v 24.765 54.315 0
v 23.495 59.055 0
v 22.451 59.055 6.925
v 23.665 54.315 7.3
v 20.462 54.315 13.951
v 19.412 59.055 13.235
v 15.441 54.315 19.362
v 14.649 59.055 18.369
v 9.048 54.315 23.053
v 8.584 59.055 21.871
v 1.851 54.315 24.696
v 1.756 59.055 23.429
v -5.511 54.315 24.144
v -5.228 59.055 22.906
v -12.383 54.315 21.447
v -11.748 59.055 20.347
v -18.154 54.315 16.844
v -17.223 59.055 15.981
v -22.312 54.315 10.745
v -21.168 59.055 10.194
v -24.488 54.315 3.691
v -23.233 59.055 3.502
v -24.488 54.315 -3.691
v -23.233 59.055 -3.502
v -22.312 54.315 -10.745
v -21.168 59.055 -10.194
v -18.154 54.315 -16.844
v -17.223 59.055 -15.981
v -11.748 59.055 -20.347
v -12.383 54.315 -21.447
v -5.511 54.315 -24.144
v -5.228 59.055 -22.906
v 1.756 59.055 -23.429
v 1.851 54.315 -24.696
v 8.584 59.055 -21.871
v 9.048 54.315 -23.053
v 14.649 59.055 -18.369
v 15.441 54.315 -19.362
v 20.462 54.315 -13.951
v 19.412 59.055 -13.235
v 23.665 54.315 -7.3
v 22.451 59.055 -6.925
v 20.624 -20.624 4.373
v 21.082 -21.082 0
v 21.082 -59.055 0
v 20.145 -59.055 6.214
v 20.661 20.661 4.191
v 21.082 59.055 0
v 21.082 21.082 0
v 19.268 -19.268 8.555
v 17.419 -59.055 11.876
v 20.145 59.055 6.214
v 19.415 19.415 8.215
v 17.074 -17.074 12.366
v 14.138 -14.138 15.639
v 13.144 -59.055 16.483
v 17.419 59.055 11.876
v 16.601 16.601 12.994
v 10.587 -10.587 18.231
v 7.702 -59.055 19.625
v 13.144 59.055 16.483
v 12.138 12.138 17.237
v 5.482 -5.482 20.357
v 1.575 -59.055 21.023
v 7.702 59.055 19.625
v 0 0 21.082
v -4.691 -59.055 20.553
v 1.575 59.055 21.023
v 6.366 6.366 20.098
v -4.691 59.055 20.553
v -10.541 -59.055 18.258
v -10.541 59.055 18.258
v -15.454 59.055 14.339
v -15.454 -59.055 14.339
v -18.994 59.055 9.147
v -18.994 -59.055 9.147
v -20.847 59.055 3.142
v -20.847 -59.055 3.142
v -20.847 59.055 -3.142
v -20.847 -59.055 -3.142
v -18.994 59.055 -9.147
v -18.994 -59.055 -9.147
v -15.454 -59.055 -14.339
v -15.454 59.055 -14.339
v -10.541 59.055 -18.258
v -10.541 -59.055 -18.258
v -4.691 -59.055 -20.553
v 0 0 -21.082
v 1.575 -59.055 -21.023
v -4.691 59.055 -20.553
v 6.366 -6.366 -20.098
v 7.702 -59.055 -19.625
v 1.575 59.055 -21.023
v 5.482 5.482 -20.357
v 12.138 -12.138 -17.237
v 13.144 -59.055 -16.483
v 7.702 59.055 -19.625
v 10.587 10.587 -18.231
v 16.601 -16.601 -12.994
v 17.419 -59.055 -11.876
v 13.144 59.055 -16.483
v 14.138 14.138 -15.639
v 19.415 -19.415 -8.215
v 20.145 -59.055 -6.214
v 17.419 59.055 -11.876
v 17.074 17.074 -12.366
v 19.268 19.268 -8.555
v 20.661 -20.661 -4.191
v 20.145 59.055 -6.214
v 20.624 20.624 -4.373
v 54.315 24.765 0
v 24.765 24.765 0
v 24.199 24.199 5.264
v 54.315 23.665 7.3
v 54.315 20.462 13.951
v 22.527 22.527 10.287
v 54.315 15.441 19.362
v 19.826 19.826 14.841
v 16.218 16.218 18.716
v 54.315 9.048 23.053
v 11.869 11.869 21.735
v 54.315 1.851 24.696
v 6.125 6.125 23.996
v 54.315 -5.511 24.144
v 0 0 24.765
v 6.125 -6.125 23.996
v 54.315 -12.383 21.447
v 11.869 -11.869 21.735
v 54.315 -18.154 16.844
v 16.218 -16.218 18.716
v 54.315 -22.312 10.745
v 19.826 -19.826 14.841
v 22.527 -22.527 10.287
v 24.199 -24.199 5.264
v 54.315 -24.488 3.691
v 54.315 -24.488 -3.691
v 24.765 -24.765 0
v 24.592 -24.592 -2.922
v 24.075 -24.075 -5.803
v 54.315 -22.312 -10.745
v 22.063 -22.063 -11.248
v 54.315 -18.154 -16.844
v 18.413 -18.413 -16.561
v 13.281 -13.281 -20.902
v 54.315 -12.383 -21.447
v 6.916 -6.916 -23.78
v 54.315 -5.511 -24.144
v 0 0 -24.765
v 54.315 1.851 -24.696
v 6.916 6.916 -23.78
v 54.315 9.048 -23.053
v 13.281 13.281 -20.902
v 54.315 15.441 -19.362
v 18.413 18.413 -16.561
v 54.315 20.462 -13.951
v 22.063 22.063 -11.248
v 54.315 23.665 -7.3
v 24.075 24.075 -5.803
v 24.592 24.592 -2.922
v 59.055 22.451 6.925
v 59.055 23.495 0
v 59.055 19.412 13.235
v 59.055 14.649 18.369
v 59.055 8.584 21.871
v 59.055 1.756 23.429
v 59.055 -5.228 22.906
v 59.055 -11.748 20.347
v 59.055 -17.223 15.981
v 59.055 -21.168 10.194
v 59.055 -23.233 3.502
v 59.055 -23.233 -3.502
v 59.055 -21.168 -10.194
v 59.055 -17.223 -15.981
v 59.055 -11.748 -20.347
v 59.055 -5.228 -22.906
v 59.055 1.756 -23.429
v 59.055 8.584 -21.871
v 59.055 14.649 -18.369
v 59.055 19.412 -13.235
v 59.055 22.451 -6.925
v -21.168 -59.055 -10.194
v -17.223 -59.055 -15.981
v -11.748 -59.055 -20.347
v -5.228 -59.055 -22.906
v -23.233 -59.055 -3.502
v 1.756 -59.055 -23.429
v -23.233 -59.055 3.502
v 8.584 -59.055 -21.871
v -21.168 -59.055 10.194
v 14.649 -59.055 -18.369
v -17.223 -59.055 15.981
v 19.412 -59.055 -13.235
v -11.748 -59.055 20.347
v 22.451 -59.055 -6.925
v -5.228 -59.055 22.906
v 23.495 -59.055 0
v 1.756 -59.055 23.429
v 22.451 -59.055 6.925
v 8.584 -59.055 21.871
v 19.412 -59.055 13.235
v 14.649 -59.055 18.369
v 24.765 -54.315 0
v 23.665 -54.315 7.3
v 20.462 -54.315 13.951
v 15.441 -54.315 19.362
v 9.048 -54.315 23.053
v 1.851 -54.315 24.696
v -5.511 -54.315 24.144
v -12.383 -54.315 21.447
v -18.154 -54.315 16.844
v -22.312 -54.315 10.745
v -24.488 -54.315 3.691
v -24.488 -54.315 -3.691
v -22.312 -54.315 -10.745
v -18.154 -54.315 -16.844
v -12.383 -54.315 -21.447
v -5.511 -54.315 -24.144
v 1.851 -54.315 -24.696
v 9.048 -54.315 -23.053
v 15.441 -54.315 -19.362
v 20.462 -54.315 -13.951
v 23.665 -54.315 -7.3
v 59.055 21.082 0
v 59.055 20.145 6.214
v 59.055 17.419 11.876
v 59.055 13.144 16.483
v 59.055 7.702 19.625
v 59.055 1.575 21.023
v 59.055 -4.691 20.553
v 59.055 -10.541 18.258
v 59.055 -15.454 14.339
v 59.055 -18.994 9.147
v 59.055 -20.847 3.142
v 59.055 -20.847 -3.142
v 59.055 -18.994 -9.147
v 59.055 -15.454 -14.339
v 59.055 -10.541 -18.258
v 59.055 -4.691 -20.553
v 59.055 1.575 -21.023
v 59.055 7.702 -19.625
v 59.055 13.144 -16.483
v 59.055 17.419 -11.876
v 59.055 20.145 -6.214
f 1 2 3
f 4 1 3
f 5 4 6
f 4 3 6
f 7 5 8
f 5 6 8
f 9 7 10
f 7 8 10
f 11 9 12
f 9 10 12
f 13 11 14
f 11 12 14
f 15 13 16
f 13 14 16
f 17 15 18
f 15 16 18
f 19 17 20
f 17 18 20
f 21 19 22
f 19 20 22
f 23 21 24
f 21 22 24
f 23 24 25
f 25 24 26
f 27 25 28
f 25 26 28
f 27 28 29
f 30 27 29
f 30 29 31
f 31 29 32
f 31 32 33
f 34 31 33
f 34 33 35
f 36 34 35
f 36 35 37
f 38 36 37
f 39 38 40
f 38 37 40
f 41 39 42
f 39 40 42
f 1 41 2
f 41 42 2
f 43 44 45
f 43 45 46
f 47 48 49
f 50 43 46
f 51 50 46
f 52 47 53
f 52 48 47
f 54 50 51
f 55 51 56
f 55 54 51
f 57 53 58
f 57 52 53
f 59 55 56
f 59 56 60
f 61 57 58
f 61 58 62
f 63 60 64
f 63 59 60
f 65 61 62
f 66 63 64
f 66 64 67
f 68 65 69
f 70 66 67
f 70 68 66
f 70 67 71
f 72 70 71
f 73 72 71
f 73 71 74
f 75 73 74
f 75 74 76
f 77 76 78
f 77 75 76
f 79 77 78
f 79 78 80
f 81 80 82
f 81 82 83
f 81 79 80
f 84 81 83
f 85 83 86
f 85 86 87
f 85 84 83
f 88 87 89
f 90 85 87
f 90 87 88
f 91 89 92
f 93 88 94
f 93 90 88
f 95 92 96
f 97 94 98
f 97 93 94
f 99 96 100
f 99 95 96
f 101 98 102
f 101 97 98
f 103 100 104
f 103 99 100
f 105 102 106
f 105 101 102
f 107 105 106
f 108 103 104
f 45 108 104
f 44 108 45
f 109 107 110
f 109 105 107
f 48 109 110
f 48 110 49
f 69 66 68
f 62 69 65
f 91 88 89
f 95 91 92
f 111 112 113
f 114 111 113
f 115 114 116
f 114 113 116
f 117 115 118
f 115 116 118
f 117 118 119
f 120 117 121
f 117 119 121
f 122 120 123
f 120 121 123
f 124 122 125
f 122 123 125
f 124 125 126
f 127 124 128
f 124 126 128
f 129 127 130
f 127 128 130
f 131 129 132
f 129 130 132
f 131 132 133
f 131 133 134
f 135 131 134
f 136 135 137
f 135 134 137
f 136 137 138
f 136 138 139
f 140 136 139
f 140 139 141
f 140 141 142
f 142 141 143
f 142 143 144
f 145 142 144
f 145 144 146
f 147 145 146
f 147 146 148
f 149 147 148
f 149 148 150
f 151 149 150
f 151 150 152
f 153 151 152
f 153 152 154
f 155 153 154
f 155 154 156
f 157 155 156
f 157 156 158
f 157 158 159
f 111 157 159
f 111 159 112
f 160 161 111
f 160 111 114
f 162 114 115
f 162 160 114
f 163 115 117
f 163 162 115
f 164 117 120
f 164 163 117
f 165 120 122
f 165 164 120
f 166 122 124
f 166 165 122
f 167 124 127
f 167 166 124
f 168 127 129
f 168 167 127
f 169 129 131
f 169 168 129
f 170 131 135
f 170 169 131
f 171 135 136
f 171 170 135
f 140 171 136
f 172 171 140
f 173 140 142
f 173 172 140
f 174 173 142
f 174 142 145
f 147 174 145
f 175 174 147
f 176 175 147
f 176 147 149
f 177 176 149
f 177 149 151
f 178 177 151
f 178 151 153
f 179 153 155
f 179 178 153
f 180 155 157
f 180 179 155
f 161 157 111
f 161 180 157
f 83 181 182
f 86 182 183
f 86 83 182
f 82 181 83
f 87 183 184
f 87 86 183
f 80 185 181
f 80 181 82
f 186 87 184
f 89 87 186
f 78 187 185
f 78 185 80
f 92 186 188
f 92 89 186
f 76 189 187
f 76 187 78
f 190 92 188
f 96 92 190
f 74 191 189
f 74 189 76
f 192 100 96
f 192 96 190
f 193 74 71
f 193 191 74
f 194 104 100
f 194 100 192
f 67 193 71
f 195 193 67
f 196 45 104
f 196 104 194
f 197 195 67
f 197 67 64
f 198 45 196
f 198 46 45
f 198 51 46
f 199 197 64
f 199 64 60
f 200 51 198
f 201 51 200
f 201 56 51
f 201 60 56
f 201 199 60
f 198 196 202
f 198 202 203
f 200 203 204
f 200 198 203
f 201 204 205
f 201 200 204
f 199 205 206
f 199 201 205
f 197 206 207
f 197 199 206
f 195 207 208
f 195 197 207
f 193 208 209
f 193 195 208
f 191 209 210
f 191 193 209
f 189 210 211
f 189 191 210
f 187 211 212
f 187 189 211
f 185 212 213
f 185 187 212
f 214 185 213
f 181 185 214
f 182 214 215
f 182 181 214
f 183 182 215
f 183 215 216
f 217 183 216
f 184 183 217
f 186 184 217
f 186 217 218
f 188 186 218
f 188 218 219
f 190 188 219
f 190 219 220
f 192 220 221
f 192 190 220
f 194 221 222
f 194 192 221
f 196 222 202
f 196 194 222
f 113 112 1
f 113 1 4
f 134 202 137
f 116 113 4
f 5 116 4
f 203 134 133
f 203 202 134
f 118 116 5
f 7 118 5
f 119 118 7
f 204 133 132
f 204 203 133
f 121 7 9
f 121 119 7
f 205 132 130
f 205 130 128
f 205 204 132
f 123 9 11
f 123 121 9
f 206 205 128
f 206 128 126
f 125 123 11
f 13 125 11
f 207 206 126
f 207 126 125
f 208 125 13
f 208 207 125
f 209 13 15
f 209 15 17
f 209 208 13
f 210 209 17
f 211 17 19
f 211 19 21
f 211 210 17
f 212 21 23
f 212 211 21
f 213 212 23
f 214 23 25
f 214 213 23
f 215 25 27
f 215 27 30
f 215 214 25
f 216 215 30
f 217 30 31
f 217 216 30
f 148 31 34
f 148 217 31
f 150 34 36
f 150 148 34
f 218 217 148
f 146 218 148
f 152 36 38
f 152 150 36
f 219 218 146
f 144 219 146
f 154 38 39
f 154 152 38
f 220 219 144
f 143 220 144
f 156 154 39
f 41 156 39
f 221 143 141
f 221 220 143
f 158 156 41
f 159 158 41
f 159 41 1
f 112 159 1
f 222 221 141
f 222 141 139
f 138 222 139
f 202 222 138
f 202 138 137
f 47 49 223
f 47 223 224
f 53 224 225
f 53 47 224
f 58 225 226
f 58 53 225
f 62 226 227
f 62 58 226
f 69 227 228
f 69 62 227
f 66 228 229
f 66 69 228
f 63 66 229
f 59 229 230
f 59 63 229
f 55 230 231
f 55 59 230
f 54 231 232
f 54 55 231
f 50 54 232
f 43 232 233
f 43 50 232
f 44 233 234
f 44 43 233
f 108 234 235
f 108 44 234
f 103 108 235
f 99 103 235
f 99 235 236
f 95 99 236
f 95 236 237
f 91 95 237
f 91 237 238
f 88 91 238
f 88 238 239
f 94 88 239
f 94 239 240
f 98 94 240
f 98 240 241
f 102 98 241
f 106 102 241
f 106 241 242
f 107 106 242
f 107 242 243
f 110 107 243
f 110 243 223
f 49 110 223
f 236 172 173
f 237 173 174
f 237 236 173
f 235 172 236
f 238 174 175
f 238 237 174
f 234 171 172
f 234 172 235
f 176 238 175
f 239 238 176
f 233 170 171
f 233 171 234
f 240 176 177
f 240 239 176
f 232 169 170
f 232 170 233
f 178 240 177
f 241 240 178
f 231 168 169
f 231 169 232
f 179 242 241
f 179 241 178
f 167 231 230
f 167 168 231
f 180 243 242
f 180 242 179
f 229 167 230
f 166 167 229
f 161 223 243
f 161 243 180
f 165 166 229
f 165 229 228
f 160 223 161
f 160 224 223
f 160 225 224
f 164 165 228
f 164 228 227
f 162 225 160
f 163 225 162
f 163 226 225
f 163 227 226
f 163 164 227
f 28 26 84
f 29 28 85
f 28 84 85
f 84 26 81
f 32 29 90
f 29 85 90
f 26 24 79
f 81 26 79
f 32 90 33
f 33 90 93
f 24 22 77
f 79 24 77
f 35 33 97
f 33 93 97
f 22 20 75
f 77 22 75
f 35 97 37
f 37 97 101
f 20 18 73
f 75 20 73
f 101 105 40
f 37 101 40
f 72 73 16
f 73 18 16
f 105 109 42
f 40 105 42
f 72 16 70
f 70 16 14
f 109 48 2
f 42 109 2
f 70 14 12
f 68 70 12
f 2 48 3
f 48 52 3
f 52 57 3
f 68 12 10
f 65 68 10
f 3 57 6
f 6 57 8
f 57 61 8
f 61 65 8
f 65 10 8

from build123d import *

# Parameters (mm, degrees)
F0_R          = 24.765
F0_R_2        = 21.082
F1_DEPTH      = 59.055
F2_R          = 24.765
F2_R_2        = 21.082
F3_DEPTH      = 59.055
F4_DEPTH      = 59.0560001
F5_DEPTH      = 59.0560001
F5_DEPTH_BACK = 59.0560001
F6_SIZE2      = 1.27
F6_SIZE       = 4.7397045256
F6_2_SIZE2    = 1.27
F6_2_SIZE     = 4.7397045256


# Not quite as in the source:
# - two fillets or chamfers of one size are made in one step


with BuildPart() as f1:
    # F0 (on Front) → F1 (new body, symmetric)
    with BuildSketch(Plane.XZ):
        Circle(F0_R)
        Circle(F0_R_2, mode=Mode.SUBTRACT)
    extrude(amount=F1_DEPTH, both=True)

    # F2 (on Right) → F3 (join)
    with BuildSketch(Plane.YZ):
        Circle(F2_R)
        Circle(F2_R_2, mode=Mode.SUBTRACT)
    extrude(amount=F3_DEPTH)

    # F2 (on Right) → F4 (cut, through all)
    with BuildSketch(Plane.YZ):
        Circle(F2_R_2)
    extrude(amount=F4_DEPTH, mode=Mode.SUBTRACT)

    # F0 (on Front) → F5 (cut, two sides)
    with BuildSketch(Plane.XZ) as f5_sk:
        Circle(F0_R_2)
    extrude(amount=F5_DEPTH, mode=Mode.SUBTRACT)
    extrude(f5_sk.sketch, amount=-F5_DEPTH_BACK, mode=Mode.SUBTRACT)

    # F6
    f6_edges = [f1.edges().sort_by_distance(p)[0] for p in [
        (-24.765, -59.055, 0),
        (-24.765, 59.055, 0),
    ]]
    f6_side = f1.faces().sort_by_distance((-24.765, 0, 0))[0]
    chamfer(f6_edges, length=F6_SIZE, length2=F6_SIZE2, reference=f6_side)

    # F6#2
    f6_2_edges = [f1.edges().sort_by_distance(p)[0] for p in [
        (59.055, -24.765, 0),
    ]]
    f6_2_side = f1.faces().sort_by_distance((29.5275, -24.765, 0))[0]
    chamfer(f6_2_edges, length=F6_2_SIZE, length2=F6_2_SIZE2, reference=f6_2_side)


solid = f1.part
